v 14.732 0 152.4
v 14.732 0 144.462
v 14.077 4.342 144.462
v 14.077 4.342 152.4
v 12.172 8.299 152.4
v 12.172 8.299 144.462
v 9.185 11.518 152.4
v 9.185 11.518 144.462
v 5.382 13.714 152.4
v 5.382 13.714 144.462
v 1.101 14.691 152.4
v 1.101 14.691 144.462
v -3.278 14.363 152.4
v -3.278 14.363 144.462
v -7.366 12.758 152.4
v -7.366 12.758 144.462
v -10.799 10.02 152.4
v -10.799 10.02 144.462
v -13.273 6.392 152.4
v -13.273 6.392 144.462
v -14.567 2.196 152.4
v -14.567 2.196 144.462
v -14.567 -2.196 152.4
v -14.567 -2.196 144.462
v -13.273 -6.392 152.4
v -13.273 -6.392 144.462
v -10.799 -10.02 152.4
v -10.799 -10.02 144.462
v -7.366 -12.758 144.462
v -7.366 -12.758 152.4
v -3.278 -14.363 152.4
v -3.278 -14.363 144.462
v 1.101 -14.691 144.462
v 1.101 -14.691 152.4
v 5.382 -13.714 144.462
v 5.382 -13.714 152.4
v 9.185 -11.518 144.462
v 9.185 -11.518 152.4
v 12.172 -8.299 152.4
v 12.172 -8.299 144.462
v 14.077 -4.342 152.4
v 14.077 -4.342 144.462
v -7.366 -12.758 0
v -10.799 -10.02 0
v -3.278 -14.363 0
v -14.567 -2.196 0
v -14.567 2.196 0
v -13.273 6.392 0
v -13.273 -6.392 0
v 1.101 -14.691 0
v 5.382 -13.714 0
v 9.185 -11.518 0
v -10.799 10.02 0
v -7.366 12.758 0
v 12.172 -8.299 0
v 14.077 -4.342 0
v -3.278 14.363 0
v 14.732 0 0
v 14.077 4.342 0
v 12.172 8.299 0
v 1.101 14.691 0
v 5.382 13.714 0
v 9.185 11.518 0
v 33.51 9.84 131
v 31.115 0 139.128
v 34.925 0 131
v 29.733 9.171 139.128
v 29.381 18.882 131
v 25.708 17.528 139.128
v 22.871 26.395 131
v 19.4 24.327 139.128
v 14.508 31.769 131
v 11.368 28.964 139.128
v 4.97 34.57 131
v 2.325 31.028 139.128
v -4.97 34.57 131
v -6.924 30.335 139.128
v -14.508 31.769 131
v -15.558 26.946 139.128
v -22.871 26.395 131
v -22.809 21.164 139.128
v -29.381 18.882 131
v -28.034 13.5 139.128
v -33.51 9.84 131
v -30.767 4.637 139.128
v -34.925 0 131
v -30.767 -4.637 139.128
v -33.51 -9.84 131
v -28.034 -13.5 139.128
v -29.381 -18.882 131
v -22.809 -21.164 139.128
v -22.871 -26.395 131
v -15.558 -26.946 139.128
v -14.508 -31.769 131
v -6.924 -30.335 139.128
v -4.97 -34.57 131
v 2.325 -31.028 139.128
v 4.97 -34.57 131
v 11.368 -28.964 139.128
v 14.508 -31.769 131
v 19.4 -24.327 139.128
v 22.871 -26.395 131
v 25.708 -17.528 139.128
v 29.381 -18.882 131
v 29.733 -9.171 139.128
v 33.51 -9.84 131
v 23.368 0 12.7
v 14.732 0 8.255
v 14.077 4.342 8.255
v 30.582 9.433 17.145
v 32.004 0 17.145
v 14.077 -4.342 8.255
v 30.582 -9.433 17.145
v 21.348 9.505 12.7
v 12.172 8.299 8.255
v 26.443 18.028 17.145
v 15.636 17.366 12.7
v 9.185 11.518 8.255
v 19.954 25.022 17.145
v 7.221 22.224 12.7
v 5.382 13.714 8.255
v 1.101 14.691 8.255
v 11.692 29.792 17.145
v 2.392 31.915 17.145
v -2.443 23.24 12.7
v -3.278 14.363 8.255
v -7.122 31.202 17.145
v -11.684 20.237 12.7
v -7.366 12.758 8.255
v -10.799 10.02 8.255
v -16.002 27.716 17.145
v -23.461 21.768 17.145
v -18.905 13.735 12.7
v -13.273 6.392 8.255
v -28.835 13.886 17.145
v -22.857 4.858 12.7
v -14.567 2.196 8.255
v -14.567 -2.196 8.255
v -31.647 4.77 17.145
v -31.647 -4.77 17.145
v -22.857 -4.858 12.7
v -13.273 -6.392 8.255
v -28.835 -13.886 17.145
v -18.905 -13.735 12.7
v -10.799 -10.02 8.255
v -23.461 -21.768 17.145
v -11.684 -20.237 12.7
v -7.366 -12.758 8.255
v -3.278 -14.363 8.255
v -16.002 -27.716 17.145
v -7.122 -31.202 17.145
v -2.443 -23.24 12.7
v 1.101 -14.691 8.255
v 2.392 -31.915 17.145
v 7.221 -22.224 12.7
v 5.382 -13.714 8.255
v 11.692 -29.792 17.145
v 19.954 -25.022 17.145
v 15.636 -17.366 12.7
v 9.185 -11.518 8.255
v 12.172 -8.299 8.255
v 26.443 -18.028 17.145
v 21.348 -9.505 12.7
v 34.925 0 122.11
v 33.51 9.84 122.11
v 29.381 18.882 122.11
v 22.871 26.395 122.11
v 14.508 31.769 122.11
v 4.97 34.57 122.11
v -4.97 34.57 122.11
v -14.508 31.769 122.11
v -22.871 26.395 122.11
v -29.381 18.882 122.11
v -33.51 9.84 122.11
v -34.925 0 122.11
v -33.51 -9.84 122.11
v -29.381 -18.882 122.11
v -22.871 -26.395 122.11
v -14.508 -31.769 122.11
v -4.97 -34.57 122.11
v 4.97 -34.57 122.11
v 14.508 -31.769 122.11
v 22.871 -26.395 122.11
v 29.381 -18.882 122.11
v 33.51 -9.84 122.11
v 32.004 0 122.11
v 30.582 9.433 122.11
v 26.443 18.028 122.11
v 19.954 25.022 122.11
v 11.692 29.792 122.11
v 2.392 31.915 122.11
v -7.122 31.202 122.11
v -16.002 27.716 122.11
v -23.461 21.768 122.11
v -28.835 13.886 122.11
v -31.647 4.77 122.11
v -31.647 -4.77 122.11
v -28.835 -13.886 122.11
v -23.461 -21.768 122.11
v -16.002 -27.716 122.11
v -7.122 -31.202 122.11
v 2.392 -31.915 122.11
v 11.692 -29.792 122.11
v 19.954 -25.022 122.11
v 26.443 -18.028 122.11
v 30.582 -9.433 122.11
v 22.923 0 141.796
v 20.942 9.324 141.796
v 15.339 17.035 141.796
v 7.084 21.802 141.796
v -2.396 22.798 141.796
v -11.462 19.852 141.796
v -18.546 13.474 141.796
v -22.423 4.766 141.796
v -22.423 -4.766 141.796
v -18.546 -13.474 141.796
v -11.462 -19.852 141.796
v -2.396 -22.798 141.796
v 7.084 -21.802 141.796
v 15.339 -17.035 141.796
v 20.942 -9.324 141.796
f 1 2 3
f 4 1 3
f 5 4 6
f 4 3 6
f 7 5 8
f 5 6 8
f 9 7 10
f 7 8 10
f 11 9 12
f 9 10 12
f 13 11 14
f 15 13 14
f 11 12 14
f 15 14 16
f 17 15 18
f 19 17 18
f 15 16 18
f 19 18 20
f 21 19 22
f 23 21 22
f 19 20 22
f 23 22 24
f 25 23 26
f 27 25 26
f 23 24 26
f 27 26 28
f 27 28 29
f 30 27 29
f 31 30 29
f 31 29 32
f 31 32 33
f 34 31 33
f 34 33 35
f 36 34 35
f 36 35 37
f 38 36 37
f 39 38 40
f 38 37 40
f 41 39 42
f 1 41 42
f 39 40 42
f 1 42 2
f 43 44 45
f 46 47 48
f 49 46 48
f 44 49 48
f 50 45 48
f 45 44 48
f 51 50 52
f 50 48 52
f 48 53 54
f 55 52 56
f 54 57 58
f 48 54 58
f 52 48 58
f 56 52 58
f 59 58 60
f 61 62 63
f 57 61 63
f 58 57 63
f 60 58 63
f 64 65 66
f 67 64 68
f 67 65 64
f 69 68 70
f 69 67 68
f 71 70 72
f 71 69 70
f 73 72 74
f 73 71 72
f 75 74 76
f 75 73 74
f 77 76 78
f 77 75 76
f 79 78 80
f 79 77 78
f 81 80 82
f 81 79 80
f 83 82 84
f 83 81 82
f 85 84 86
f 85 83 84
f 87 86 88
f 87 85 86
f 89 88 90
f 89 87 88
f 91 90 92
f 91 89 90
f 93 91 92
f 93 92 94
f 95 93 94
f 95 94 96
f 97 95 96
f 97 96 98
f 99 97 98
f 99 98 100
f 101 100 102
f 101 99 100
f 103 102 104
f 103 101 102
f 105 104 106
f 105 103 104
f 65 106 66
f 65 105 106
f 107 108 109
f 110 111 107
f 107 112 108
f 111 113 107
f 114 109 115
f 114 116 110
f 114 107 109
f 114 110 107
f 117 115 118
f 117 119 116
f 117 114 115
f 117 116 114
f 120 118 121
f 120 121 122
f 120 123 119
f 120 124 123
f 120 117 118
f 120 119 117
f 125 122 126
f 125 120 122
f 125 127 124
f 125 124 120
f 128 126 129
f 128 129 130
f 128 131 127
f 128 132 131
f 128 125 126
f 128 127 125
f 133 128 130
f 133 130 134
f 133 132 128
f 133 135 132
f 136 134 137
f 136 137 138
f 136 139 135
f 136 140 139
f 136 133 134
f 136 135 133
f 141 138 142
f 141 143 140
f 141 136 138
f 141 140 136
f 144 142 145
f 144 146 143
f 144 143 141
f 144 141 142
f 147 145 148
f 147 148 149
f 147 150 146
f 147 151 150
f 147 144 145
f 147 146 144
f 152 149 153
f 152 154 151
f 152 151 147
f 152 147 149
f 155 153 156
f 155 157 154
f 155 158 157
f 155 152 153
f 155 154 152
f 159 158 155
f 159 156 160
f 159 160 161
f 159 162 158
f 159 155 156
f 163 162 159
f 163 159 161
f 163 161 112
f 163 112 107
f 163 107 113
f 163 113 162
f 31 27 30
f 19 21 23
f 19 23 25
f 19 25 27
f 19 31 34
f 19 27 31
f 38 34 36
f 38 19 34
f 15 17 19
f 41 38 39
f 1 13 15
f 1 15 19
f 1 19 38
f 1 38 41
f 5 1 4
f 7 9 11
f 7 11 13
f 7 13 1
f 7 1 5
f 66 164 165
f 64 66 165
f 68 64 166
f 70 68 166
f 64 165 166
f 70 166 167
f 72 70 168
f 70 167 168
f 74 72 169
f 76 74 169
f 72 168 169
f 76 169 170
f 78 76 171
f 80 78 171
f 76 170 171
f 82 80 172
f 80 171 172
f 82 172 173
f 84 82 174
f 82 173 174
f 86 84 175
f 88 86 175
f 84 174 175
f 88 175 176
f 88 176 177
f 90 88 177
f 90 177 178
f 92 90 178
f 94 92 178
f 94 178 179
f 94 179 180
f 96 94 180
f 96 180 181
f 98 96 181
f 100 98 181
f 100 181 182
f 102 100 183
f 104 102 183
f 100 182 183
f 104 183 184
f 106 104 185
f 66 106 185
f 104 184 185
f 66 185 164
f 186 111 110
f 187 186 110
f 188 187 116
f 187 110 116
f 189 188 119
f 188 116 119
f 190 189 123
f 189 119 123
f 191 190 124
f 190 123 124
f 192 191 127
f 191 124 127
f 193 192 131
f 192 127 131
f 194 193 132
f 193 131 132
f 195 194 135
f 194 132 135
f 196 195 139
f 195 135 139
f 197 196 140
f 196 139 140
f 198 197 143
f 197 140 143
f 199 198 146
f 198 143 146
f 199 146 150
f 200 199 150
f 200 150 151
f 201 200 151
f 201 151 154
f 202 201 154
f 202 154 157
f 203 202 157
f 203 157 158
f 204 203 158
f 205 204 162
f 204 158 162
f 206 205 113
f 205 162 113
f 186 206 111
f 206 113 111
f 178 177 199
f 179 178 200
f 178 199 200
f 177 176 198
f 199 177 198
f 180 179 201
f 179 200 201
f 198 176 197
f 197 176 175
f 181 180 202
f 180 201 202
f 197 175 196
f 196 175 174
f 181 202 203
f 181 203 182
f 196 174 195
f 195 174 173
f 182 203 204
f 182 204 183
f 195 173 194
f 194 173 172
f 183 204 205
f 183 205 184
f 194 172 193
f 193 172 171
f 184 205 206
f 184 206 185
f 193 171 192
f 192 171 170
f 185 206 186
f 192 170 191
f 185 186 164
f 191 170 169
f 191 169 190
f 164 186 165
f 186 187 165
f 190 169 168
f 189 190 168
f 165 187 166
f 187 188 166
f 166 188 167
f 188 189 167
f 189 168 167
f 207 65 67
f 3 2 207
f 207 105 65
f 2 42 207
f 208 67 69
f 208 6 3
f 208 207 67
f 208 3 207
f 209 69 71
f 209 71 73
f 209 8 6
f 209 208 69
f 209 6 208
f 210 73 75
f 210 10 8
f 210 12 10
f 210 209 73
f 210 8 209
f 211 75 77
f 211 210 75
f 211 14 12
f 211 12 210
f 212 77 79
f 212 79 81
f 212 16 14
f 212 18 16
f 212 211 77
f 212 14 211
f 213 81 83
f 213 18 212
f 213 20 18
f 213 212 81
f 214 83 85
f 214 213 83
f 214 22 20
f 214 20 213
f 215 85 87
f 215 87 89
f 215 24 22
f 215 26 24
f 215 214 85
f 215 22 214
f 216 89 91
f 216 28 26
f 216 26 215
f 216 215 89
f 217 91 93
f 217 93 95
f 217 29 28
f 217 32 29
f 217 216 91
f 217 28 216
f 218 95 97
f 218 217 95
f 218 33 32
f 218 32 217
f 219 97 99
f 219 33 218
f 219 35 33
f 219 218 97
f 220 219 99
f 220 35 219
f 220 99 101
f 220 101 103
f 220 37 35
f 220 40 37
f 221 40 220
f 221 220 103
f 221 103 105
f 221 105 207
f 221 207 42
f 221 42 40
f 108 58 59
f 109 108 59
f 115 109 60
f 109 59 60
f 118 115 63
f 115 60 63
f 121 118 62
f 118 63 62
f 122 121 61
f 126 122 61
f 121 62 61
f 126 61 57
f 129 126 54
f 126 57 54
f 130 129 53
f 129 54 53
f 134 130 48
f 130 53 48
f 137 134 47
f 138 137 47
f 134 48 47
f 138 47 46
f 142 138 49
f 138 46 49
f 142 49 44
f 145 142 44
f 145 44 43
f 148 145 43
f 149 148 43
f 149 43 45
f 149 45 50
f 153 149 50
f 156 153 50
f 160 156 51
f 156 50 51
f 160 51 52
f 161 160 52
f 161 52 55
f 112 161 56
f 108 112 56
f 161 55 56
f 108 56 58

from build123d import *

# Parameters (mm, degrees)
SKETCH1_R           = 14.732
BOSS_EXTRUDE1_DEPTH = 8.255
SKETCH2_R           = 14.732
SKETCH3_R           = 32.004
SKETCH4_R           = 32.004
BOSS_EXTRUDE2_DEPTH = 104.9655
SKETCH5_R           = 34.925
BOSS_EXTRUDE3_DEPTH = 8.89
SKETCH6_R           = 34.925
SKETCH7_R           = 31.115
SKETCH8_R           = 31.115
SKETCH9_R           = 14.732
SKETCH10_R          = 14.732
BOSS_EXTRUDE4_DEPTH = 7.9375


with BuildPart() as part:
    # Sketch1 → Boss-Extrude1 (new body)
    with BuildSketch(Plane.XY):
        Circle(SKETCH1_R)
    extrude(amount=BOSS_EXTRUDE1_DEPTH)

    # Sketch2 → Loft1 section 0
    with BuildSketch(Plane.XY.offset(8.255)):
        Circle(SKETCH2_R)
    # Sketch3 → Loft1 section 1
    with BuildSketch(Plane.XY.offset(17.145)):
        Circle(SKETCH3_R)
    loft()

    # Sketch4 → Boss-Extrude2 (add)
    with BuildSketch(Plane.XY.offset(17.145)):
        Circle(SKETCH4_R)
    extrude(amount=BOSS_EXTRUDE2_DEPTH)

    # Sketch5 → Boss-Extrude3 (add)
    with BuildSketch(Plane.XY.offset(122.1105)):
        Circle(SKETCH5_R)
    extrude(amount=BOSS_EXTRUDE3_DEPTH)

    # Sketch6 → Loft2 section 0
    with BuildSketch(Plane.XY.offset(131.0005)):
        Circle(SKETCH6_R)
    # Sketch7 → Loft2 section 1
    with BuildSketch(Plane.XY.offset(139.1285)):
        Circle(SKETCH7_R)
    loft()

    # Sketch8 → Loft3 section 0
    with BuildSketch(Plane.XY.offset(139.1285)):
        Circle(SKETCH8_R)
    # Sketch9 → Loft3 section 1
    with BuildSketch(Plane.XY.offset(144.4625)):
        Circle(SKETCH9_R)
    loft()

    # Sketch10 → Boss-Extrude4 (add)
    with BuildSketch(Plane.XY.offset(144.4625)):
        Circle(SKETCH10_R)
    extrude(amount=BOSS_EXTRUDE4_DEPTH)


solid = part.part
